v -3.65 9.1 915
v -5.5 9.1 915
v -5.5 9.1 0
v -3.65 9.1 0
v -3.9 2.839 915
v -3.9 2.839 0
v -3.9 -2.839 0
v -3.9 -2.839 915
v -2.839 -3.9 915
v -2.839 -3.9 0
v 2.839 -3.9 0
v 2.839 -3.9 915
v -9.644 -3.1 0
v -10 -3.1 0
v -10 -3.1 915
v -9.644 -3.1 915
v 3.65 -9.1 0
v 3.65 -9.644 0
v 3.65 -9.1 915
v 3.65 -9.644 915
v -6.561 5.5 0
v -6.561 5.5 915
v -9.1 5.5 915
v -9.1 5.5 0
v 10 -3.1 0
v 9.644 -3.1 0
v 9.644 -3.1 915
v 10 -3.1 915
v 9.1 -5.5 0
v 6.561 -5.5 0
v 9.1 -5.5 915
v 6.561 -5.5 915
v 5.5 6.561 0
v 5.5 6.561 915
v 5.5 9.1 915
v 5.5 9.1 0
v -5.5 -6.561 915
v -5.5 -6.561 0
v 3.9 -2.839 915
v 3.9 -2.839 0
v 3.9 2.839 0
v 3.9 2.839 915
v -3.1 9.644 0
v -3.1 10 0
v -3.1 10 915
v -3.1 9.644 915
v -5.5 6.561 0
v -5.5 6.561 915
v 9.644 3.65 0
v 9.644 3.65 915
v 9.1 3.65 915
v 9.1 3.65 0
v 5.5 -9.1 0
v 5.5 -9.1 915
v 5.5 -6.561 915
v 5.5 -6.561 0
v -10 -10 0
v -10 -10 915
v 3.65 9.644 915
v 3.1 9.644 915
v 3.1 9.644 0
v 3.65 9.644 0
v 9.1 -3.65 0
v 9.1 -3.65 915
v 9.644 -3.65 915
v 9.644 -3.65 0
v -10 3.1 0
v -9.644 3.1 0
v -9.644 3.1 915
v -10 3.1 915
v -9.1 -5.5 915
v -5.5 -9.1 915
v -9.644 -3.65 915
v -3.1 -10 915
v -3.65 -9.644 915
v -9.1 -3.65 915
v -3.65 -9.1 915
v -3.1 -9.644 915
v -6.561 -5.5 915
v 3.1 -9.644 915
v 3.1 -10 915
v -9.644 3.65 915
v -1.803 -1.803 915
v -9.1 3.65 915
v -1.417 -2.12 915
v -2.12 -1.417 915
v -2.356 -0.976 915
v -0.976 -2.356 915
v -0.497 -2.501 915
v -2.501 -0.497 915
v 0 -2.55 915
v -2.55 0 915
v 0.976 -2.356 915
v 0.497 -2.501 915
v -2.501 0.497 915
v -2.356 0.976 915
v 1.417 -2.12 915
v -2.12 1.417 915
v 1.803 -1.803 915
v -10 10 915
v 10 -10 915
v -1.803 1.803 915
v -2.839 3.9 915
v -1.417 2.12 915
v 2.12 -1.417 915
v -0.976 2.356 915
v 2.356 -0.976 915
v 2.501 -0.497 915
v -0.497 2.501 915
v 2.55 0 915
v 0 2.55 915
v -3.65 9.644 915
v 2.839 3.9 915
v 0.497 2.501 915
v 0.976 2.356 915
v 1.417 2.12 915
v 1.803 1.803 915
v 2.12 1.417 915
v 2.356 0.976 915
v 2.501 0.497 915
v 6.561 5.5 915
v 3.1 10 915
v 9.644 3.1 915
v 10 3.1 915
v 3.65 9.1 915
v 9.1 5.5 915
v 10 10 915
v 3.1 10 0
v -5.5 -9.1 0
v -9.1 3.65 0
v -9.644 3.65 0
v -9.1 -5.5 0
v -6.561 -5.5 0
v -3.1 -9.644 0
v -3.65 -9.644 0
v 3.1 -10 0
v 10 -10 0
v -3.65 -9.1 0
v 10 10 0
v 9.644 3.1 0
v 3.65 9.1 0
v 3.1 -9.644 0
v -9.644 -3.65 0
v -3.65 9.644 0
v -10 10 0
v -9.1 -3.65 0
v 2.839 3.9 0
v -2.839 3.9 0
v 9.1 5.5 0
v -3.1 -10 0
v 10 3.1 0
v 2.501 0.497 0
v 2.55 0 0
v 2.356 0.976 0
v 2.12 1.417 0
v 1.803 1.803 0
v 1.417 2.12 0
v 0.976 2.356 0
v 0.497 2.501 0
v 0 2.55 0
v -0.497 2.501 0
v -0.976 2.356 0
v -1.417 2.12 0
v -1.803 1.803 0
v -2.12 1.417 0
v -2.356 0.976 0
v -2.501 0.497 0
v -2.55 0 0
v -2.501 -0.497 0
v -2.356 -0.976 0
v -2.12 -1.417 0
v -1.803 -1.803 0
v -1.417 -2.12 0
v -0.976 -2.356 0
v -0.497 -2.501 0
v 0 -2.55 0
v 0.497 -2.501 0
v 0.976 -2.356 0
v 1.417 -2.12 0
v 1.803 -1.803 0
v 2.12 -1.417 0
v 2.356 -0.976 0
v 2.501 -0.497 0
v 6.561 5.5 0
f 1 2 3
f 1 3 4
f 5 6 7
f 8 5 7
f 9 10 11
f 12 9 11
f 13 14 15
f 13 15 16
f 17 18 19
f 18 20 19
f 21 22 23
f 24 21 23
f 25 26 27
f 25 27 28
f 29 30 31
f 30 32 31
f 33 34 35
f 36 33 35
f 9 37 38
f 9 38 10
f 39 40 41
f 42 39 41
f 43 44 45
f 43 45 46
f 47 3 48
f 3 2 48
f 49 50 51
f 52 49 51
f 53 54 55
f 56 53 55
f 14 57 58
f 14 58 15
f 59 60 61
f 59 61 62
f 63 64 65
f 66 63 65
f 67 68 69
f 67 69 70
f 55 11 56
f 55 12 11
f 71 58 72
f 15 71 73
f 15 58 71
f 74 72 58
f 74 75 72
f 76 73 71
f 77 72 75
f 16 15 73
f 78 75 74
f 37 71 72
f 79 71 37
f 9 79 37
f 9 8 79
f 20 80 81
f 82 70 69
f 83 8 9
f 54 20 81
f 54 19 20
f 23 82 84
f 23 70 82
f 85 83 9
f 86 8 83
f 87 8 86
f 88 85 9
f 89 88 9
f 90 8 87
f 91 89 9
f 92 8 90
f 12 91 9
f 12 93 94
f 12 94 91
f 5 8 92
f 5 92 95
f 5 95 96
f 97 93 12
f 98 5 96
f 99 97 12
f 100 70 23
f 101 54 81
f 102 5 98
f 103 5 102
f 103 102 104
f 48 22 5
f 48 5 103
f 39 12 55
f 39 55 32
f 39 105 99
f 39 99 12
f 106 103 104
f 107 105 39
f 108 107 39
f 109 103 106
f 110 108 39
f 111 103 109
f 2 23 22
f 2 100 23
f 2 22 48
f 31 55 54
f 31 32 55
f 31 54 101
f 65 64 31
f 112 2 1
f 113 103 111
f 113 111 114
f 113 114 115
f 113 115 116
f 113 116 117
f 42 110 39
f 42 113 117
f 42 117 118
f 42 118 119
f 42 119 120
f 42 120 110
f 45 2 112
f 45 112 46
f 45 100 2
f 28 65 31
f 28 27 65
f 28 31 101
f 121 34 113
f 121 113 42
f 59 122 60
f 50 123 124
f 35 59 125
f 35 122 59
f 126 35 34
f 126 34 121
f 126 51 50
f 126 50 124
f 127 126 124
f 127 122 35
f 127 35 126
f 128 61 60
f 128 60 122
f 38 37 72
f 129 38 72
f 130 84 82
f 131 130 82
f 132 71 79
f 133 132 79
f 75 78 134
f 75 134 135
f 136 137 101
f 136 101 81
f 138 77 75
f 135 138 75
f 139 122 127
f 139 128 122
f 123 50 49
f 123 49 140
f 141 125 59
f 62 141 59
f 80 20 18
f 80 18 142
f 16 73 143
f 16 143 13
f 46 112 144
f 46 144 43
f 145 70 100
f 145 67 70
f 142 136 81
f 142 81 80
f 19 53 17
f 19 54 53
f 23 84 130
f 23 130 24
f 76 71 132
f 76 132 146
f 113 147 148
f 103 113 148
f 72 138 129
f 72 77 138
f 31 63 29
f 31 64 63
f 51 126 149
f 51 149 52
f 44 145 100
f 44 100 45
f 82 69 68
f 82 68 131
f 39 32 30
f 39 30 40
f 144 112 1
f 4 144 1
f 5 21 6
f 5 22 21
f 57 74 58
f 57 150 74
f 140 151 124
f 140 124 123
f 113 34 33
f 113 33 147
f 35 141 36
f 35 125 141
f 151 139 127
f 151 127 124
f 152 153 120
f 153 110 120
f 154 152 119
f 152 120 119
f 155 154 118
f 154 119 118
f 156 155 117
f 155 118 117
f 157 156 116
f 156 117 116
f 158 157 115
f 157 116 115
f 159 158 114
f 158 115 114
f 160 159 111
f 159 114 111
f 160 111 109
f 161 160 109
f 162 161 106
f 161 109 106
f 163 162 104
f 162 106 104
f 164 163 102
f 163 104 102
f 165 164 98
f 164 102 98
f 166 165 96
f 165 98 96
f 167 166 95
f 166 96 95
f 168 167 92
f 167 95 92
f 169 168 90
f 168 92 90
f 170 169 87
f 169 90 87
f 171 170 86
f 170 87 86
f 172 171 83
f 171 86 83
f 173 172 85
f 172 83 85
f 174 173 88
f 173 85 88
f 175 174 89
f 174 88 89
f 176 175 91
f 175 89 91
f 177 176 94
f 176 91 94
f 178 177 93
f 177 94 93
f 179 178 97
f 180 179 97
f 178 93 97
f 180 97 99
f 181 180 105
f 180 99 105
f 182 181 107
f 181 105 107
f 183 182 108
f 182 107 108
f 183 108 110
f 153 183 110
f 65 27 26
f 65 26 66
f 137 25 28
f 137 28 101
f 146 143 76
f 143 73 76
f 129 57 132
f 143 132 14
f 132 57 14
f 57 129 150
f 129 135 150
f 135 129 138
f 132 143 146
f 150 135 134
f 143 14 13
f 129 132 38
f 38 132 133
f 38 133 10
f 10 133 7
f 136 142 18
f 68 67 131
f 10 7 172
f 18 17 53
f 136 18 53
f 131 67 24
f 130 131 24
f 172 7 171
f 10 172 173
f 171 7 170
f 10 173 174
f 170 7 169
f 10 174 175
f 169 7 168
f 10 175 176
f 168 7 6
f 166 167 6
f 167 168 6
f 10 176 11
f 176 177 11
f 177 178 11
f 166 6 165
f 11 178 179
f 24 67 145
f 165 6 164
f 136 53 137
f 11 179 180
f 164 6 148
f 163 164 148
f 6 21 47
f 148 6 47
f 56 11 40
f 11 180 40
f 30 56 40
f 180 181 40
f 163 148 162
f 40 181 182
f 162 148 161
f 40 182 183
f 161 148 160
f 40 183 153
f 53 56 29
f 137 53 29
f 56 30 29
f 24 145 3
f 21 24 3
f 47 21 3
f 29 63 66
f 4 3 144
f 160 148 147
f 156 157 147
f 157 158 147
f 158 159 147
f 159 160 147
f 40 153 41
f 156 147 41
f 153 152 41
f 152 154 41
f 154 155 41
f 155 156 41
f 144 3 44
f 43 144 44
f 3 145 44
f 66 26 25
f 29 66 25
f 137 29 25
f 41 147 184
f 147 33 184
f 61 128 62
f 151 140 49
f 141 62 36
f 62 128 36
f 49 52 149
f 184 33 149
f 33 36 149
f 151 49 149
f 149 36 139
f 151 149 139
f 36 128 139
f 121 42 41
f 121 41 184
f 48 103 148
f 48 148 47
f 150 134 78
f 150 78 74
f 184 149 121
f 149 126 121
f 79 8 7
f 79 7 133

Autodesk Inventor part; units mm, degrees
ref_plane "YZ Plane" through (0, 0, 0) normal (1, 0, 0) x (0, 1, 0)
ref_plane "XZ Plane" through (0, 0, 0) normal (0, 1, 0) x (-1, 0, 0)
ref_plane "XY Plane" through (0, 0, 0) normal (0, 0, 1) x (1, 0, 0)
sketch "草图1" plane through (0, 0, 0) normal (0, 0, 1) x (1, 0, 0)
  line L0 (10, -10) -> (-10, -10)
  line L1 (-10, -10) -> (-10, 10)
  line L2 (-10, 10) -> (10, 10)
  line L3 (10, 10) -> (10, -10)
  line L4 (10, -10) -> (-10, 10) construction
  line L5 (-10, -10) -> (10, 10) construction
  point P0 (0, 0)
  dimension "d0" = 20
  dimension "d1" = 20
extrude "拉伸1" add sketch "草图1" along normal blind 915
sketch "草图2" plane through (0, 0, 915) normal (0, 0, 1) x (1, 0, 0)
  circle A0 centre (0, 0) radius 2.55
  line L0 (-11.0615, 0) -> (0, 0)
  line L1 (0, 0) -> (0, 11.55)
  line L2 (-10, 10) -> (-10, -10)
  line L3 (10, 10) -> (-10, 10)
  line L4 (0, 3.9) -> (-3.9, 3.9)
  line L5 (-3.9, 3.9) -> (-3.9, 0)
  line L6 (-10, 10) -> (0, 0)
  line L7 (0, 1.0607) -> (-8.9393, 10)
  line L8 (-1.0607, 0) -> (-10, 8.9393)
  line L9 (-10, 10) -> (-3.1, 10)
  line L10 (-10, 3.1) -> (-10, 10)
  line L11 (-10, 10) -> (-3.65, 10)
  line L12 (-10, 3.65) -> (-10, 10)
  line L13 (-5.5, 12.0125) -> (-5.5, 5.5)
  line L14 (-10, 10) -> (-5.5, 10)
  line L15 (-5.5, 10) -> (-5.5, 5.5)
  line L16 (-5.5, 5.5) -> (-10, 5.5)
  line L17 (-10, 5.5) -> (-10, 10)
  line L18 (-5.5, 9.1) -> (0, 9.1)
  line L19 (-3.65, 10) -> (-3.65, 9.1)
  line L20 (-3.1, 10) -> (-3.1, 9.1)
  line L21 (-3.65, 9.6441) -> (-3.1, 9.6441)
  point P0 (-3.1, 9.55)
  point P1 (-2.8393, 3.9)
  point P2 (0, 10)
  point P3 (-5.5, 6.5607)
  dimension "d4" = 5.1
  dimension "d5" = 6.1
  dimension "d6" = 1.5
  dimension "d7" = 5.5
  dimension "d8" = 0.9
  dimension "d9" = 3.1
  dimension "d10" = 3.65
extrude "拉伸2" cut sketch "草图2" against normal up to surface (915 mm away) contours A0 L0 L1 | L1 L7 A0 | A0 L8 L0 | L7 L1 L6 A0 | L4 L7 L13 L18 L1 | A0 L6 L0 L8 | L18 L20 L3 L1 | L18 L19 L21 L20
mirror "镜像1" about plane through (0, 10, 915) normal (-1, 0, 0) of "拉伸2"
pattern_circular "环形阵列1" count 4 over 360 about axis through (0, 0, 915) along (0, 0, -1) of "拉伸2", "镜像1"
properties part number "铝方管2020中"
